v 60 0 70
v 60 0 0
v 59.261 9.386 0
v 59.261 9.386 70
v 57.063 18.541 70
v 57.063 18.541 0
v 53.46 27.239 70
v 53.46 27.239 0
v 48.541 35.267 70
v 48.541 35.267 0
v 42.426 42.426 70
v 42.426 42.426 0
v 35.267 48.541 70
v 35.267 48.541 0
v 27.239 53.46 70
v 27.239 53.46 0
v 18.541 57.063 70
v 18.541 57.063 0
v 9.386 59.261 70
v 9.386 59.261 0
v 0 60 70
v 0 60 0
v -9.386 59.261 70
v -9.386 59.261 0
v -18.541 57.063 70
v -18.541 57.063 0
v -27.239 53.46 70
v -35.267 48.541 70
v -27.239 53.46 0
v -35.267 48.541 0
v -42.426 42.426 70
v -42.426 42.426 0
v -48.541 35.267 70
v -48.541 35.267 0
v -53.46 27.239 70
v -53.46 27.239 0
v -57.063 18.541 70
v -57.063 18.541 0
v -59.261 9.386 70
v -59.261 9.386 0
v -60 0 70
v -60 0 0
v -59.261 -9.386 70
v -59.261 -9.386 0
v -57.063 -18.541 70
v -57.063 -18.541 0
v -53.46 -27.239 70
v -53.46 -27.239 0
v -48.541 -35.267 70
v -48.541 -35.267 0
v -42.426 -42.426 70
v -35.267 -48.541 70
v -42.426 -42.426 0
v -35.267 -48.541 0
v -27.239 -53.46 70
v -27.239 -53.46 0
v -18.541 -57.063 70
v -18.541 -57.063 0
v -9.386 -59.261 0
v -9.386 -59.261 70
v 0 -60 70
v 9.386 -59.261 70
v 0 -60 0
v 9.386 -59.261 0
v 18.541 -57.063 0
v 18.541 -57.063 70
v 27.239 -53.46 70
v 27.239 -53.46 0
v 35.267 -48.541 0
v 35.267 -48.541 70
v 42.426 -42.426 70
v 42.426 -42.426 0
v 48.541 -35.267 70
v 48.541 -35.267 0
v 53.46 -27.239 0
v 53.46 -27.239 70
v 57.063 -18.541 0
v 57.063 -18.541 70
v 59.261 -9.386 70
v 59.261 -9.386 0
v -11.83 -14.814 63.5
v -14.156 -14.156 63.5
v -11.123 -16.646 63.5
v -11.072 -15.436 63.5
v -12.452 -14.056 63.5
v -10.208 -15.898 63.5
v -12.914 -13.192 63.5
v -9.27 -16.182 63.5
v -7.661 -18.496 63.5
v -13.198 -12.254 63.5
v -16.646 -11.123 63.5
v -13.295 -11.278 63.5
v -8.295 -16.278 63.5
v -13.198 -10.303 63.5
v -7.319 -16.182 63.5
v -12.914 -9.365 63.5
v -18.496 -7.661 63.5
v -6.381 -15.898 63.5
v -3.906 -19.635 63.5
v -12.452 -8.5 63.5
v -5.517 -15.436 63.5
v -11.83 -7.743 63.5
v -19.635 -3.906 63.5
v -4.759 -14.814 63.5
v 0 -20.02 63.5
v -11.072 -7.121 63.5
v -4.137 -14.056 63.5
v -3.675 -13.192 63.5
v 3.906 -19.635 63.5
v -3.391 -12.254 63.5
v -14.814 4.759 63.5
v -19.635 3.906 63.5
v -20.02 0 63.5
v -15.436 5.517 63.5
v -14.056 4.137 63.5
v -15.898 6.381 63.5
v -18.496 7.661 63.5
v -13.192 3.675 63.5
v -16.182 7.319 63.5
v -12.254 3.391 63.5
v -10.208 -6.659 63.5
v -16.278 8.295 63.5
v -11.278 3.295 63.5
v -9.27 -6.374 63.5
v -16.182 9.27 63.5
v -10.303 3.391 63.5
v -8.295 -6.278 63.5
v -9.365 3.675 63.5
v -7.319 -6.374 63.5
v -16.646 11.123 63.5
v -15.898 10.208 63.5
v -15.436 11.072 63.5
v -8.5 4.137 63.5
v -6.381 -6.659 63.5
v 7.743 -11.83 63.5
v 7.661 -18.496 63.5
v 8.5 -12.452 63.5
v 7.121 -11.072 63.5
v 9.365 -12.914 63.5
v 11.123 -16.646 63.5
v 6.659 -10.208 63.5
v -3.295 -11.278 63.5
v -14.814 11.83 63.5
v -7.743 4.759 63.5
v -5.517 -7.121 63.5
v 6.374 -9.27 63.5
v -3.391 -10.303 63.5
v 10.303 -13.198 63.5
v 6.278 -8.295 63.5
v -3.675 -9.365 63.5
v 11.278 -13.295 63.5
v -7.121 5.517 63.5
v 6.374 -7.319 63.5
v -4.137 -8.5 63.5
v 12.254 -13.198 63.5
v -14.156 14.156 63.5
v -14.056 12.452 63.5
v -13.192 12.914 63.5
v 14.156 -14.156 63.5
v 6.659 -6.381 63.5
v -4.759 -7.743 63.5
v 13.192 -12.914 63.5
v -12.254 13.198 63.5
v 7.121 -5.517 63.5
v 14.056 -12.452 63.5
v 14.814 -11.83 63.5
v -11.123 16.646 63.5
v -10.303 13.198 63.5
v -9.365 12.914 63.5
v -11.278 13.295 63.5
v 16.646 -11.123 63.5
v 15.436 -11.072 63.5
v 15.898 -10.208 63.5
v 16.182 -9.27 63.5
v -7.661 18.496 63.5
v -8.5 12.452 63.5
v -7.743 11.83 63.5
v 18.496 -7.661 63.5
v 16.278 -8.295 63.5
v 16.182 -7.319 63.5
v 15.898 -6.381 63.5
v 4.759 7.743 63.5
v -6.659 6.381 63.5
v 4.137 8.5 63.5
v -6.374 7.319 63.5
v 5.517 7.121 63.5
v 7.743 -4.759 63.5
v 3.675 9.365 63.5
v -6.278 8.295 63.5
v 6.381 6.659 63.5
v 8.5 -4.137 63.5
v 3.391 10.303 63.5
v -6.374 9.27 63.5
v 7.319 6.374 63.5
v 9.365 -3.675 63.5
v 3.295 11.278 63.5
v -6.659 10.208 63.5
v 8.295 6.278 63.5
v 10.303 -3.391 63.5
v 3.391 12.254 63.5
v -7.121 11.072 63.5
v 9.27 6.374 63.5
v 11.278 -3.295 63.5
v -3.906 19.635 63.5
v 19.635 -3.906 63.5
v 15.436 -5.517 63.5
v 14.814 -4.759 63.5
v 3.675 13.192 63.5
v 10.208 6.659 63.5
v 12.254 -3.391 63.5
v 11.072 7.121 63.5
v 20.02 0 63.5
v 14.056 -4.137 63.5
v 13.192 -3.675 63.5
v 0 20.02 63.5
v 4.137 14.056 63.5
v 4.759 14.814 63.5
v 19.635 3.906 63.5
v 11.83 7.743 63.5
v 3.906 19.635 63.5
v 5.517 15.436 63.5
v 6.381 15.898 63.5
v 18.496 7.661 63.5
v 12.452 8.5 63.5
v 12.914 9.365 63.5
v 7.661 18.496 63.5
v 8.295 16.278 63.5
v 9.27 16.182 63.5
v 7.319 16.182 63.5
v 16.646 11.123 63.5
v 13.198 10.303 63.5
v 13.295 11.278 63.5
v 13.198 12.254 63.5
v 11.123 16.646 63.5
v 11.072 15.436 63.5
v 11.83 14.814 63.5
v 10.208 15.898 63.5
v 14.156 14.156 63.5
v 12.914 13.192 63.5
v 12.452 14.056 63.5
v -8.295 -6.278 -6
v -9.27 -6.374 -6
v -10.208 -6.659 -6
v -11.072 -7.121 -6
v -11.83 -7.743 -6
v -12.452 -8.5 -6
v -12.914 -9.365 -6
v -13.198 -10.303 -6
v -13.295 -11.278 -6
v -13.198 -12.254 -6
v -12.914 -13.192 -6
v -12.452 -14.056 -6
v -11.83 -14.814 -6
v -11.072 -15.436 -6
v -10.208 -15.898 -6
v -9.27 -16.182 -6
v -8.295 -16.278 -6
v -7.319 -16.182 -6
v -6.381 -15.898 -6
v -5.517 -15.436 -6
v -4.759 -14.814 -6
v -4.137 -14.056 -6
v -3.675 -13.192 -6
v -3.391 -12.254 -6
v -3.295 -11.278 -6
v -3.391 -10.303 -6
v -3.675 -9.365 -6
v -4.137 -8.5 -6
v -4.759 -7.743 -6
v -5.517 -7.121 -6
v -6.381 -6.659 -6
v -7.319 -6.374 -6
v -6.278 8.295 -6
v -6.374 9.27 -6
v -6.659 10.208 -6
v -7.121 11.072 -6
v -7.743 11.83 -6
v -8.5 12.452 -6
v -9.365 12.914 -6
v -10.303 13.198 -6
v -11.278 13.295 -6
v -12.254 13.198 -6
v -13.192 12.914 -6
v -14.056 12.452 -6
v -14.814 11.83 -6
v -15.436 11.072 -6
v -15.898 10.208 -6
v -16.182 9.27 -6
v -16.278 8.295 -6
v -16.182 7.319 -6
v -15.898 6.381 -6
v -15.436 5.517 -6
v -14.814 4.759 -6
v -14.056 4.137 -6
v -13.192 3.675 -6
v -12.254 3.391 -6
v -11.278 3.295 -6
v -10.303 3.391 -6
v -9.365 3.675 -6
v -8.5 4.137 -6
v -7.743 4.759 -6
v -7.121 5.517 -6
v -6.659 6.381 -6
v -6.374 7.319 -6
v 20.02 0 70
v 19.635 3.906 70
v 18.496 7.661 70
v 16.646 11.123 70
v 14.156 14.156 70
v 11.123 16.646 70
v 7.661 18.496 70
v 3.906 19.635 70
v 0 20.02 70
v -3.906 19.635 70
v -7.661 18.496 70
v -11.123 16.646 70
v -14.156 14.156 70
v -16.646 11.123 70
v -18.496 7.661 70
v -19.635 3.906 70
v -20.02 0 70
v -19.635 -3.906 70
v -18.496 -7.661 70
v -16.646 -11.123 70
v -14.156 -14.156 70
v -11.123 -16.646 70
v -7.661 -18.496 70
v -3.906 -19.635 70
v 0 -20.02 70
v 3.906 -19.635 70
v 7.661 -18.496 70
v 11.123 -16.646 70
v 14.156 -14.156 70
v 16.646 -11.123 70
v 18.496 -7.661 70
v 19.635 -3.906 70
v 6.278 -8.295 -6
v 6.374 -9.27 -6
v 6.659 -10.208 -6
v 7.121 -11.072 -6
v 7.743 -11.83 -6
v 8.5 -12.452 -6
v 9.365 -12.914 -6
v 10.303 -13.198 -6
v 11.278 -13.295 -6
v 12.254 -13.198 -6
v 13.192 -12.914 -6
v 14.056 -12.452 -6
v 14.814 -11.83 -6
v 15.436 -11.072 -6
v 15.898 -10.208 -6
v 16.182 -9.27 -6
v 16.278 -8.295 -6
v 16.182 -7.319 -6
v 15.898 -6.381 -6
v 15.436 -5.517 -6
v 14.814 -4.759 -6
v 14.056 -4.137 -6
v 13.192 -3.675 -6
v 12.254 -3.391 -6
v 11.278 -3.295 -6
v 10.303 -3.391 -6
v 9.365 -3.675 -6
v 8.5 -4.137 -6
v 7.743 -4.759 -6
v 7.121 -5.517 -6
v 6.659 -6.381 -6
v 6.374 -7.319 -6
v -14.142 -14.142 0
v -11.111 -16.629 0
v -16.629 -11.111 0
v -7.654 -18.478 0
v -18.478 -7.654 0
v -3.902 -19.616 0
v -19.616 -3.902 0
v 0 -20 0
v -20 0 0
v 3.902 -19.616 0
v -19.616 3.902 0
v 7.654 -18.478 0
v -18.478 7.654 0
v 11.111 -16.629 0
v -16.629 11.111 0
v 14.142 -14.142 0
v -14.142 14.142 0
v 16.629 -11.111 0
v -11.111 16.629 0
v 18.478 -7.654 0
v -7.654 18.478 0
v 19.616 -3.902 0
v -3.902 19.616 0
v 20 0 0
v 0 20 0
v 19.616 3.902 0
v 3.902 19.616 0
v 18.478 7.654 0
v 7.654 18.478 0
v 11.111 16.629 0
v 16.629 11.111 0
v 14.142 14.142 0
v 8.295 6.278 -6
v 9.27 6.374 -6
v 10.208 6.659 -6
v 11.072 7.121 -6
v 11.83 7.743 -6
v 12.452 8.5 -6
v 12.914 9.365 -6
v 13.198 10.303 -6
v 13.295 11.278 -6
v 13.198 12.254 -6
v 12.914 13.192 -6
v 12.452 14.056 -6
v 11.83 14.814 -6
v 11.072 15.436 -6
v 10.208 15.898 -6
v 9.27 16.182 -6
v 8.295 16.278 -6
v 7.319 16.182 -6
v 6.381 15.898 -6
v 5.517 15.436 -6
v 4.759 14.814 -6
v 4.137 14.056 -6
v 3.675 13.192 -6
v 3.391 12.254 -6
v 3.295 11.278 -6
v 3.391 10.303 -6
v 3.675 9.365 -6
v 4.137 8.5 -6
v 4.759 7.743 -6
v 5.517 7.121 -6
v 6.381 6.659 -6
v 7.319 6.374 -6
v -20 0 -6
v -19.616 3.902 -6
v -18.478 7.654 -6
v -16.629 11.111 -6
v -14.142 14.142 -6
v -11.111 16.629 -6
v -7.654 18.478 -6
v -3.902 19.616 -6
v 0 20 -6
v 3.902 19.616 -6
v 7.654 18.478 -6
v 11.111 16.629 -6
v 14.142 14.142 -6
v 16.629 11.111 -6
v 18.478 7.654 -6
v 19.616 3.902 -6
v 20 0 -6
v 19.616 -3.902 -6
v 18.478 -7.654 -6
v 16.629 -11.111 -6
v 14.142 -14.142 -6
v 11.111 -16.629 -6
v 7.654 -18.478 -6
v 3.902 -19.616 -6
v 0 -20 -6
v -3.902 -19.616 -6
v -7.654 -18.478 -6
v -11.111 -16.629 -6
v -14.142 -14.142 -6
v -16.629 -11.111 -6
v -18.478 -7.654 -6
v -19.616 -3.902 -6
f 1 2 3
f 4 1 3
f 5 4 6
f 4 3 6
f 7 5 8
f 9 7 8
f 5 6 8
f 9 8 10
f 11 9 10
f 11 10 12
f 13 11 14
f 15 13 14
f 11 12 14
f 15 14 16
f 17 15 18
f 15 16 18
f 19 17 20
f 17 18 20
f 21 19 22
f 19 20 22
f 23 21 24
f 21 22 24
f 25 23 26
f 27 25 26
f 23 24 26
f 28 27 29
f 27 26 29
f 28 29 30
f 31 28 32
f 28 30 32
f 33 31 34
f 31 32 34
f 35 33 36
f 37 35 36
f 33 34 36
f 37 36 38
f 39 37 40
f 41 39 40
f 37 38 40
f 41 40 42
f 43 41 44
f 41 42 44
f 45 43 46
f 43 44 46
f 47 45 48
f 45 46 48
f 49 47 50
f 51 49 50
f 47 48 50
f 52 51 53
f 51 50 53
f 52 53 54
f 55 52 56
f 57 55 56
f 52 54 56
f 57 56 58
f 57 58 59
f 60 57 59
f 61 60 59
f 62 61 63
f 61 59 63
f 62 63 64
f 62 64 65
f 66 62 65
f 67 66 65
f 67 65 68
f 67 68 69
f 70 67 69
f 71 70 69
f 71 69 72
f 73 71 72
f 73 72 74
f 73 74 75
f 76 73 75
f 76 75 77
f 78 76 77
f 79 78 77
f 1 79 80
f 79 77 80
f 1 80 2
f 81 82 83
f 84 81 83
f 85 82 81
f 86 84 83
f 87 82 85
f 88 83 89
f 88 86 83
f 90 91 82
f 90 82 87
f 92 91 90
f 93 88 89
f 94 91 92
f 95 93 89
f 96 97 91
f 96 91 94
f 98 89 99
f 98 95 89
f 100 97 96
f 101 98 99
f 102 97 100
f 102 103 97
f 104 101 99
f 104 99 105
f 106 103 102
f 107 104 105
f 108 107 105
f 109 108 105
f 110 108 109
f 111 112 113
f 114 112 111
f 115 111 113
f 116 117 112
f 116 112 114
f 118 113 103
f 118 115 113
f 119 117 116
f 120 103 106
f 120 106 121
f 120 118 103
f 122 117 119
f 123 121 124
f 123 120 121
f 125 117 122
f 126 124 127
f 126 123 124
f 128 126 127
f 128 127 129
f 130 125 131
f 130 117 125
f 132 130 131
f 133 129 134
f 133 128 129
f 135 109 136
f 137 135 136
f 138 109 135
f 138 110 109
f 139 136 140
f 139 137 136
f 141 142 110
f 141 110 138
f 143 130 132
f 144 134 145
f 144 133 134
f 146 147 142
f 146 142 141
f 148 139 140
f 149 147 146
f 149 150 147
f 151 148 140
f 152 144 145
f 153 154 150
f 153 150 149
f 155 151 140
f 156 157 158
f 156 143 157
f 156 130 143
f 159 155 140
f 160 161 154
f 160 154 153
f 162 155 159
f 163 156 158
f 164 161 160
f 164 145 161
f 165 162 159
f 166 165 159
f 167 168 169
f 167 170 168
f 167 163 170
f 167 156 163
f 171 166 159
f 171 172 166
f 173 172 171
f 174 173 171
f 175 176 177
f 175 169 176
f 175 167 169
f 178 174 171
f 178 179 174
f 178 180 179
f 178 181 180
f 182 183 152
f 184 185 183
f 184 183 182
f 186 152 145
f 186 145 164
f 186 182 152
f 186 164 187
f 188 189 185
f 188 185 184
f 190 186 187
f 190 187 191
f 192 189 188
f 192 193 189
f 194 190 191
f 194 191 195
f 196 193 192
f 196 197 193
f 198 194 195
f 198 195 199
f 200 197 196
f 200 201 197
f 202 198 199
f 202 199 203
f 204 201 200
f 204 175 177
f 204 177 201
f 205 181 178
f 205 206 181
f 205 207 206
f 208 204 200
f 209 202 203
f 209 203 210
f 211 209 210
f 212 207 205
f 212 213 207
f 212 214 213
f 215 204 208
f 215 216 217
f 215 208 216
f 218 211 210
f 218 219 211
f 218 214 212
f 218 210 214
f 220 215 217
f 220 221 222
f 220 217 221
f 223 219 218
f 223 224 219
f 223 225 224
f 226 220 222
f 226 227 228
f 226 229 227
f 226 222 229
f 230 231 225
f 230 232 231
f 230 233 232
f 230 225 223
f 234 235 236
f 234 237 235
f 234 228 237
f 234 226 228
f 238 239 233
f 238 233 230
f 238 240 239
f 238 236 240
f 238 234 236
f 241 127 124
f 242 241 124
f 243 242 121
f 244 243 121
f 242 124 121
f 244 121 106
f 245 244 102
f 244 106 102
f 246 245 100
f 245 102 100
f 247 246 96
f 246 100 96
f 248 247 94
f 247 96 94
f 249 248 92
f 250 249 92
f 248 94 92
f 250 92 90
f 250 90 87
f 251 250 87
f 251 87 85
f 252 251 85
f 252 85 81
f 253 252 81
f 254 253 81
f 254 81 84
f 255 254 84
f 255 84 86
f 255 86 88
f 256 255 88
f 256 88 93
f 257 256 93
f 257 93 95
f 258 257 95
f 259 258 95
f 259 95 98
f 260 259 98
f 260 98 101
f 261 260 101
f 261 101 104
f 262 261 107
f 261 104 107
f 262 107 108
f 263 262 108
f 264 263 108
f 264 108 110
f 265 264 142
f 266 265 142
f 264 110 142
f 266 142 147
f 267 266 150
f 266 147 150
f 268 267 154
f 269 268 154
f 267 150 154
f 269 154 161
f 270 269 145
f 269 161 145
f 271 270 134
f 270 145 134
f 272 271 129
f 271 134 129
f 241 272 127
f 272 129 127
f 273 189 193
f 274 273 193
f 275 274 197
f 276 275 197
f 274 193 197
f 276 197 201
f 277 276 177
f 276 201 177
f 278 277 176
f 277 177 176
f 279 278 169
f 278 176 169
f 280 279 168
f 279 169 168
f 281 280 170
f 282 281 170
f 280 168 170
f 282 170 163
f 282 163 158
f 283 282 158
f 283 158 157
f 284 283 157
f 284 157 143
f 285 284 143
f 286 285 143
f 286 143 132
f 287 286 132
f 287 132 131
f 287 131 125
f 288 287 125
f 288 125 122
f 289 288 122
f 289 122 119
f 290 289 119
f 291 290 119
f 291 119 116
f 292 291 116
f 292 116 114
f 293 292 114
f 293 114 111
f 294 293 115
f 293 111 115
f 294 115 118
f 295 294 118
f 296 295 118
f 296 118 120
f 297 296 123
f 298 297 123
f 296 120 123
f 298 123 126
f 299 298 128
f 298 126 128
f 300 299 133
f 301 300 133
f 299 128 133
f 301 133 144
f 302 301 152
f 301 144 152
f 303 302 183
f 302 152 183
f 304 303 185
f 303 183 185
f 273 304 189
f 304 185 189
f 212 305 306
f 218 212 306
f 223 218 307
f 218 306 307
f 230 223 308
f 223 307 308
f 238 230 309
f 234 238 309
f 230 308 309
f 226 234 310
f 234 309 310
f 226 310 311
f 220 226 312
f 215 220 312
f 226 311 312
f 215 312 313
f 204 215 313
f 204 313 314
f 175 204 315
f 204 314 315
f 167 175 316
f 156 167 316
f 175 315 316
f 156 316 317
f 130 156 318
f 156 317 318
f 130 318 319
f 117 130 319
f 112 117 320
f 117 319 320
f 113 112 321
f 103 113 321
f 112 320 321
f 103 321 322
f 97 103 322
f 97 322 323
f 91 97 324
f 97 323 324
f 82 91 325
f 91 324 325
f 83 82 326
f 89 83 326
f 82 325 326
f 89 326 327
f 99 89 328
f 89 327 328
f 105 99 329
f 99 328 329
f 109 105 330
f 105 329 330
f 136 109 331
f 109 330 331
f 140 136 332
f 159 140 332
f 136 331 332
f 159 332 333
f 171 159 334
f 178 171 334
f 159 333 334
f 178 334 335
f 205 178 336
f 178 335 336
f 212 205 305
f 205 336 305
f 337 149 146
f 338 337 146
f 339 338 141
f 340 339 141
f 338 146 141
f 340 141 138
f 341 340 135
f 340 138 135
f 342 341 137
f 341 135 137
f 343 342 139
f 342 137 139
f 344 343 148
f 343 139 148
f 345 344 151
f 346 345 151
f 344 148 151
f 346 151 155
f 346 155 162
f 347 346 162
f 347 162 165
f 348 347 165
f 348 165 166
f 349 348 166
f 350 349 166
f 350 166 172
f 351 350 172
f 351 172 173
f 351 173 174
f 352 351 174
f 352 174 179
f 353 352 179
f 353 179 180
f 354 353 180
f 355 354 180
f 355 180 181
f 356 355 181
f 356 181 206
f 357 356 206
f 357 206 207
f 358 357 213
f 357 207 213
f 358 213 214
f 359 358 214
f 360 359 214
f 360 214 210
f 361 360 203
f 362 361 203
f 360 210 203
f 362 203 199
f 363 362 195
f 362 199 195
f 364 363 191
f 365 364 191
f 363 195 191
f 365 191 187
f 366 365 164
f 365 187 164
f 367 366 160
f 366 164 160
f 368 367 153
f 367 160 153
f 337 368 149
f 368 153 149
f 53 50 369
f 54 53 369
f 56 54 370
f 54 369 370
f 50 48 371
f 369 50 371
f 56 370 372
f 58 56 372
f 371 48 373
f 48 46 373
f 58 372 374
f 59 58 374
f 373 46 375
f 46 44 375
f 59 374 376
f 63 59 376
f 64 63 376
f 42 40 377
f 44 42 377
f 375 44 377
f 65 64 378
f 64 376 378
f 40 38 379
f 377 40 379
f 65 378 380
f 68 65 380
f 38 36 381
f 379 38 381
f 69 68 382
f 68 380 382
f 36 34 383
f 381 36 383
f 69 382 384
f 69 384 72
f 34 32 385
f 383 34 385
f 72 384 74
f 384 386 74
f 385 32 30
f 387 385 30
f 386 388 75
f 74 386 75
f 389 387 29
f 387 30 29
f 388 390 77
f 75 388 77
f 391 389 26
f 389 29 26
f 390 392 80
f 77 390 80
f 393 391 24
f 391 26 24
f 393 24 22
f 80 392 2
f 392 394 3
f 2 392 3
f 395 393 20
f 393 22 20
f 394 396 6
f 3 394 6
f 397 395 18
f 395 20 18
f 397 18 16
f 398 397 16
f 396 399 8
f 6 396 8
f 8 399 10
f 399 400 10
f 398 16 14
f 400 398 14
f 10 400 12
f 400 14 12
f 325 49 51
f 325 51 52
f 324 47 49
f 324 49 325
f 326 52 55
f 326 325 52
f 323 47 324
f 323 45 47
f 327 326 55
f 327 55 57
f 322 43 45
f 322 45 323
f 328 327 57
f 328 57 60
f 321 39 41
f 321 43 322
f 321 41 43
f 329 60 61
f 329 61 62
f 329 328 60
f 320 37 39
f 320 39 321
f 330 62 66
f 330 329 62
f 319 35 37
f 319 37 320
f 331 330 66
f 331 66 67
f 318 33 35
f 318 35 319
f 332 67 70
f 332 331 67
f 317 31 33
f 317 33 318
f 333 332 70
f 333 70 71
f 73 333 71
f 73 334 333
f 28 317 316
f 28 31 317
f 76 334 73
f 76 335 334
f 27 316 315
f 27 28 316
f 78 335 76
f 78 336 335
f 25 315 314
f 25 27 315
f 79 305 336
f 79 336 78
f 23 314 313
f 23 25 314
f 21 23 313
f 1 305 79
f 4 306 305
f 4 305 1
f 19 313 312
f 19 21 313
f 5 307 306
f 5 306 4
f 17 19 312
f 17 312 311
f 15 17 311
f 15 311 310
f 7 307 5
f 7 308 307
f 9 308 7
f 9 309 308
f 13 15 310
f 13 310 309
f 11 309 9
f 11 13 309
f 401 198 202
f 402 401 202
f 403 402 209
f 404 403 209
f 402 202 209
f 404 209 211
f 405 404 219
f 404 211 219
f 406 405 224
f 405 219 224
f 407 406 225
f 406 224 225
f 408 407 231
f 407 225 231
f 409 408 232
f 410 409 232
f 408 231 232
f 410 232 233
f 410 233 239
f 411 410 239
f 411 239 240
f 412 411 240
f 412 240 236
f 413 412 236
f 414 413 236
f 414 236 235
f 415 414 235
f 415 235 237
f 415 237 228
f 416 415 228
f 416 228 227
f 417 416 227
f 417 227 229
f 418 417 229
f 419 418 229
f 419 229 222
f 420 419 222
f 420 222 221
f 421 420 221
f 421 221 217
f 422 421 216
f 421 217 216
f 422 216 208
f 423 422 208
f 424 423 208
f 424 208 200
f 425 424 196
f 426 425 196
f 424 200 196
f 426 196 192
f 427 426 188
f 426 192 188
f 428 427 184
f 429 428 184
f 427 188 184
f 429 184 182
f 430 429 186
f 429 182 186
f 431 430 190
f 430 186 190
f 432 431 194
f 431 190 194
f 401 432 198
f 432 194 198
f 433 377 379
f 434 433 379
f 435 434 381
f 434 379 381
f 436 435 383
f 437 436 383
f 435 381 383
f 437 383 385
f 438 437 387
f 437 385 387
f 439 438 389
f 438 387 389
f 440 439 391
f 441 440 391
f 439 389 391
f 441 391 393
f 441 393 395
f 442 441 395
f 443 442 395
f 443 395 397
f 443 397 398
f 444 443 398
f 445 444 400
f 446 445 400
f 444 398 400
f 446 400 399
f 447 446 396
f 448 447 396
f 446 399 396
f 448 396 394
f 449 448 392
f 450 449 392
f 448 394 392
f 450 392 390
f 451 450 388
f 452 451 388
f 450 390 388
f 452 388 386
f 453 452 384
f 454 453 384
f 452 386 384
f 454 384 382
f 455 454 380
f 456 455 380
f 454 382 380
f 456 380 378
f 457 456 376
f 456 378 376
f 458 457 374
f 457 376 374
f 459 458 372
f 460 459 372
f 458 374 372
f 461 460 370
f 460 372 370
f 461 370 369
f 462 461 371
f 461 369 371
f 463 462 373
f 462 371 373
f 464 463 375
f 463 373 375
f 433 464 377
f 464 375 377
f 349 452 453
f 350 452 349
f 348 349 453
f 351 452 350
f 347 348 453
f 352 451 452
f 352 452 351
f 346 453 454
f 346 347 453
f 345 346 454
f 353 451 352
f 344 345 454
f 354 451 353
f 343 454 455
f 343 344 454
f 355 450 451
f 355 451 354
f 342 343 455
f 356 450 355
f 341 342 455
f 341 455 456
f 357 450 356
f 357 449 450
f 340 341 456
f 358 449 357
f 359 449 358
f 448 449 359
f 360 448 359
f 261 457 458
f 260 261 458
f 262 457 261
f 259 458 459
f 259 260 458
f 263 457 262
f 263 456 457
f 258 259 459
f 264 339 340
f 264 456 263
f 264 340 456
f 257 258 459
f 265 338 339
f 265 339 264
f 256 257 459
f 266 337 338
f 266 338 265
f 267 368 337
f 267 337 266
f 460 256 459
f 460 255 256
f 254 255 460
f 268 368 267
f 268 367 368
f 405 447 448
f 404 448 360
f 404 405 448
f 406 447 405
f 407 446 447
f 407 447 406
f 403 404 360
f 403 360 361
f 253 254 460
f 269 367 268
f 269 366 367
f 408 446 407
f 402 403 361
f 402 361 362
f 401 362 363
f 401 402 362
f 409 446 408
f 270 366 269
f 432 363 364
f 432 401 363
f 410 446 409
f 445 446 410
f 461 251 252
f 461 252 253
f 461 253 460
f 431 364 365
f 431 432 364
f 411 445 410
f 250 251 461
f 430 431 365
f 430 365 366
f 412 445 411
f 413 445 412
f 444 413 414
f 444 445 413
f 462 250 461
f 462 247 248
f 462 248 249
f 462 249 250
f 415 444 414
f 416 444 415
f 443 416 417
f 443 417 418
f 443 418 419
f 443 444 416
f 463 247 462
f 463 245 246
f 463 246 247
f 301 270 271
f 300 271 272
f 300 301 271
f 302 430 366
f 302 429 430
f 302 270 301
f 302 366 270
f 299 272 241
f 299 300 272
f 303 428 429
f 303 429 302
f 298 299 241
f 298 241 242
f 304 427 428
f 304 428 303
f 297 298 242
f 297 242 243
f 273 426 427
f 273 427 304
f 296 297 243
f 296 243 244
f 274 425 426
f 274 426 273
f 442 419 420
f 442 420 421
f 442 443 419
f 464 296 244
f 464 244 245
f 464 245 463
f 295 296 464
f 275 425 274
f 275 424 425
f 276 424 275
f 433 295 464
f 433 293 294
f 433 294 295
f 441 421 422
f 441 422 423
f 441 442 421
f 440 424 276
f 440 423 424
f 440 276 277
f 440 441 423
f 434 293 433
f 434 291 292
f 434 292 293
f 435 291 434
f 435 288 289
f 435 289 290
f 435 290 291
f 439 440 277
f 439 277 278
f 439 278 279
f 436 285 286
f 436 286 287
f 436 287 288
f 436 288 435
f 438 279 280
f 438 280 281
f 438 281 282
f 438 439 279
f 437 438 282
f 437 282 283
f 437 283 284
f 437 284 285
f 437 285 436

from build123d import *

# Parameters (mm, degrees)
SKETCH1_R           = 60
BOSS_EXTRUDE1_DEPTH = 70
SKETCH2_R           = 20.02
CUT_EXTRUDE1_DEPTH  = 6.5
SKETCH3_R           = 20
BOSS_EXTRUDE2_DEPTH = 6
SKETCH4_R           = 5
CUT_EXTRUDE2_DEPTH  = 114.912246927
CIRPATTERN1_COUNT   = 4


with BuildPart() as part:
    # Sketch1 → Boss-Extrude1 (new body)
    with BuildSketch(Plane.XY):
        Circle(SKETCH1_R)
    extrude(amount=BOSS_EXTRUDE1_DEPTH)

    # Sketch2 → Cut-Extrude1 (cut)
    with BuildSketch(Plane.XY.offset(70)):
        Circle(SKETCH2_R)
    extrude(amount=-CUT_EXTRUDE1_DEPTH, mode=Mode.SUBTRACT)

    # Sketch3 → Boss-Extrude2 (add)
    with BuildSketch(Plane(origin=(0, 0, 0), x_dir=(-1, 0, 0), z_dir=(0, 0, -1))):
        Circle(SKETCH3_R)
    extrude(amount=BOSS_EXTRUDE2_DEPTH)

    # Sketch4 → Cut-Extrude2 (cut, through all)
    with BuildSketch(Plane.XY.offset(70)):
        with Locations((-11.27834561, 8.294511456)):
            Circle(SKETCH4_R)
    cut_extrude2 = extrude(amount=-CUT_EXTRUDE2_DEPTH, mode=Mode.SUBTRACT)

    # CirPattern1: Cut-Extrude2 ×4 about axis
    cirpattern1_axis = Axis((0, 0, 0), (0, 0, 1))
    for i in range(1, CIRPATTERN1_COUNT):
        add(cut_extrude2.rotate(cirpattern1_axis, i * 360 / CIRPATTERN1_COUNT), mode=Mode.SUBTRACT)


solid = part.part
